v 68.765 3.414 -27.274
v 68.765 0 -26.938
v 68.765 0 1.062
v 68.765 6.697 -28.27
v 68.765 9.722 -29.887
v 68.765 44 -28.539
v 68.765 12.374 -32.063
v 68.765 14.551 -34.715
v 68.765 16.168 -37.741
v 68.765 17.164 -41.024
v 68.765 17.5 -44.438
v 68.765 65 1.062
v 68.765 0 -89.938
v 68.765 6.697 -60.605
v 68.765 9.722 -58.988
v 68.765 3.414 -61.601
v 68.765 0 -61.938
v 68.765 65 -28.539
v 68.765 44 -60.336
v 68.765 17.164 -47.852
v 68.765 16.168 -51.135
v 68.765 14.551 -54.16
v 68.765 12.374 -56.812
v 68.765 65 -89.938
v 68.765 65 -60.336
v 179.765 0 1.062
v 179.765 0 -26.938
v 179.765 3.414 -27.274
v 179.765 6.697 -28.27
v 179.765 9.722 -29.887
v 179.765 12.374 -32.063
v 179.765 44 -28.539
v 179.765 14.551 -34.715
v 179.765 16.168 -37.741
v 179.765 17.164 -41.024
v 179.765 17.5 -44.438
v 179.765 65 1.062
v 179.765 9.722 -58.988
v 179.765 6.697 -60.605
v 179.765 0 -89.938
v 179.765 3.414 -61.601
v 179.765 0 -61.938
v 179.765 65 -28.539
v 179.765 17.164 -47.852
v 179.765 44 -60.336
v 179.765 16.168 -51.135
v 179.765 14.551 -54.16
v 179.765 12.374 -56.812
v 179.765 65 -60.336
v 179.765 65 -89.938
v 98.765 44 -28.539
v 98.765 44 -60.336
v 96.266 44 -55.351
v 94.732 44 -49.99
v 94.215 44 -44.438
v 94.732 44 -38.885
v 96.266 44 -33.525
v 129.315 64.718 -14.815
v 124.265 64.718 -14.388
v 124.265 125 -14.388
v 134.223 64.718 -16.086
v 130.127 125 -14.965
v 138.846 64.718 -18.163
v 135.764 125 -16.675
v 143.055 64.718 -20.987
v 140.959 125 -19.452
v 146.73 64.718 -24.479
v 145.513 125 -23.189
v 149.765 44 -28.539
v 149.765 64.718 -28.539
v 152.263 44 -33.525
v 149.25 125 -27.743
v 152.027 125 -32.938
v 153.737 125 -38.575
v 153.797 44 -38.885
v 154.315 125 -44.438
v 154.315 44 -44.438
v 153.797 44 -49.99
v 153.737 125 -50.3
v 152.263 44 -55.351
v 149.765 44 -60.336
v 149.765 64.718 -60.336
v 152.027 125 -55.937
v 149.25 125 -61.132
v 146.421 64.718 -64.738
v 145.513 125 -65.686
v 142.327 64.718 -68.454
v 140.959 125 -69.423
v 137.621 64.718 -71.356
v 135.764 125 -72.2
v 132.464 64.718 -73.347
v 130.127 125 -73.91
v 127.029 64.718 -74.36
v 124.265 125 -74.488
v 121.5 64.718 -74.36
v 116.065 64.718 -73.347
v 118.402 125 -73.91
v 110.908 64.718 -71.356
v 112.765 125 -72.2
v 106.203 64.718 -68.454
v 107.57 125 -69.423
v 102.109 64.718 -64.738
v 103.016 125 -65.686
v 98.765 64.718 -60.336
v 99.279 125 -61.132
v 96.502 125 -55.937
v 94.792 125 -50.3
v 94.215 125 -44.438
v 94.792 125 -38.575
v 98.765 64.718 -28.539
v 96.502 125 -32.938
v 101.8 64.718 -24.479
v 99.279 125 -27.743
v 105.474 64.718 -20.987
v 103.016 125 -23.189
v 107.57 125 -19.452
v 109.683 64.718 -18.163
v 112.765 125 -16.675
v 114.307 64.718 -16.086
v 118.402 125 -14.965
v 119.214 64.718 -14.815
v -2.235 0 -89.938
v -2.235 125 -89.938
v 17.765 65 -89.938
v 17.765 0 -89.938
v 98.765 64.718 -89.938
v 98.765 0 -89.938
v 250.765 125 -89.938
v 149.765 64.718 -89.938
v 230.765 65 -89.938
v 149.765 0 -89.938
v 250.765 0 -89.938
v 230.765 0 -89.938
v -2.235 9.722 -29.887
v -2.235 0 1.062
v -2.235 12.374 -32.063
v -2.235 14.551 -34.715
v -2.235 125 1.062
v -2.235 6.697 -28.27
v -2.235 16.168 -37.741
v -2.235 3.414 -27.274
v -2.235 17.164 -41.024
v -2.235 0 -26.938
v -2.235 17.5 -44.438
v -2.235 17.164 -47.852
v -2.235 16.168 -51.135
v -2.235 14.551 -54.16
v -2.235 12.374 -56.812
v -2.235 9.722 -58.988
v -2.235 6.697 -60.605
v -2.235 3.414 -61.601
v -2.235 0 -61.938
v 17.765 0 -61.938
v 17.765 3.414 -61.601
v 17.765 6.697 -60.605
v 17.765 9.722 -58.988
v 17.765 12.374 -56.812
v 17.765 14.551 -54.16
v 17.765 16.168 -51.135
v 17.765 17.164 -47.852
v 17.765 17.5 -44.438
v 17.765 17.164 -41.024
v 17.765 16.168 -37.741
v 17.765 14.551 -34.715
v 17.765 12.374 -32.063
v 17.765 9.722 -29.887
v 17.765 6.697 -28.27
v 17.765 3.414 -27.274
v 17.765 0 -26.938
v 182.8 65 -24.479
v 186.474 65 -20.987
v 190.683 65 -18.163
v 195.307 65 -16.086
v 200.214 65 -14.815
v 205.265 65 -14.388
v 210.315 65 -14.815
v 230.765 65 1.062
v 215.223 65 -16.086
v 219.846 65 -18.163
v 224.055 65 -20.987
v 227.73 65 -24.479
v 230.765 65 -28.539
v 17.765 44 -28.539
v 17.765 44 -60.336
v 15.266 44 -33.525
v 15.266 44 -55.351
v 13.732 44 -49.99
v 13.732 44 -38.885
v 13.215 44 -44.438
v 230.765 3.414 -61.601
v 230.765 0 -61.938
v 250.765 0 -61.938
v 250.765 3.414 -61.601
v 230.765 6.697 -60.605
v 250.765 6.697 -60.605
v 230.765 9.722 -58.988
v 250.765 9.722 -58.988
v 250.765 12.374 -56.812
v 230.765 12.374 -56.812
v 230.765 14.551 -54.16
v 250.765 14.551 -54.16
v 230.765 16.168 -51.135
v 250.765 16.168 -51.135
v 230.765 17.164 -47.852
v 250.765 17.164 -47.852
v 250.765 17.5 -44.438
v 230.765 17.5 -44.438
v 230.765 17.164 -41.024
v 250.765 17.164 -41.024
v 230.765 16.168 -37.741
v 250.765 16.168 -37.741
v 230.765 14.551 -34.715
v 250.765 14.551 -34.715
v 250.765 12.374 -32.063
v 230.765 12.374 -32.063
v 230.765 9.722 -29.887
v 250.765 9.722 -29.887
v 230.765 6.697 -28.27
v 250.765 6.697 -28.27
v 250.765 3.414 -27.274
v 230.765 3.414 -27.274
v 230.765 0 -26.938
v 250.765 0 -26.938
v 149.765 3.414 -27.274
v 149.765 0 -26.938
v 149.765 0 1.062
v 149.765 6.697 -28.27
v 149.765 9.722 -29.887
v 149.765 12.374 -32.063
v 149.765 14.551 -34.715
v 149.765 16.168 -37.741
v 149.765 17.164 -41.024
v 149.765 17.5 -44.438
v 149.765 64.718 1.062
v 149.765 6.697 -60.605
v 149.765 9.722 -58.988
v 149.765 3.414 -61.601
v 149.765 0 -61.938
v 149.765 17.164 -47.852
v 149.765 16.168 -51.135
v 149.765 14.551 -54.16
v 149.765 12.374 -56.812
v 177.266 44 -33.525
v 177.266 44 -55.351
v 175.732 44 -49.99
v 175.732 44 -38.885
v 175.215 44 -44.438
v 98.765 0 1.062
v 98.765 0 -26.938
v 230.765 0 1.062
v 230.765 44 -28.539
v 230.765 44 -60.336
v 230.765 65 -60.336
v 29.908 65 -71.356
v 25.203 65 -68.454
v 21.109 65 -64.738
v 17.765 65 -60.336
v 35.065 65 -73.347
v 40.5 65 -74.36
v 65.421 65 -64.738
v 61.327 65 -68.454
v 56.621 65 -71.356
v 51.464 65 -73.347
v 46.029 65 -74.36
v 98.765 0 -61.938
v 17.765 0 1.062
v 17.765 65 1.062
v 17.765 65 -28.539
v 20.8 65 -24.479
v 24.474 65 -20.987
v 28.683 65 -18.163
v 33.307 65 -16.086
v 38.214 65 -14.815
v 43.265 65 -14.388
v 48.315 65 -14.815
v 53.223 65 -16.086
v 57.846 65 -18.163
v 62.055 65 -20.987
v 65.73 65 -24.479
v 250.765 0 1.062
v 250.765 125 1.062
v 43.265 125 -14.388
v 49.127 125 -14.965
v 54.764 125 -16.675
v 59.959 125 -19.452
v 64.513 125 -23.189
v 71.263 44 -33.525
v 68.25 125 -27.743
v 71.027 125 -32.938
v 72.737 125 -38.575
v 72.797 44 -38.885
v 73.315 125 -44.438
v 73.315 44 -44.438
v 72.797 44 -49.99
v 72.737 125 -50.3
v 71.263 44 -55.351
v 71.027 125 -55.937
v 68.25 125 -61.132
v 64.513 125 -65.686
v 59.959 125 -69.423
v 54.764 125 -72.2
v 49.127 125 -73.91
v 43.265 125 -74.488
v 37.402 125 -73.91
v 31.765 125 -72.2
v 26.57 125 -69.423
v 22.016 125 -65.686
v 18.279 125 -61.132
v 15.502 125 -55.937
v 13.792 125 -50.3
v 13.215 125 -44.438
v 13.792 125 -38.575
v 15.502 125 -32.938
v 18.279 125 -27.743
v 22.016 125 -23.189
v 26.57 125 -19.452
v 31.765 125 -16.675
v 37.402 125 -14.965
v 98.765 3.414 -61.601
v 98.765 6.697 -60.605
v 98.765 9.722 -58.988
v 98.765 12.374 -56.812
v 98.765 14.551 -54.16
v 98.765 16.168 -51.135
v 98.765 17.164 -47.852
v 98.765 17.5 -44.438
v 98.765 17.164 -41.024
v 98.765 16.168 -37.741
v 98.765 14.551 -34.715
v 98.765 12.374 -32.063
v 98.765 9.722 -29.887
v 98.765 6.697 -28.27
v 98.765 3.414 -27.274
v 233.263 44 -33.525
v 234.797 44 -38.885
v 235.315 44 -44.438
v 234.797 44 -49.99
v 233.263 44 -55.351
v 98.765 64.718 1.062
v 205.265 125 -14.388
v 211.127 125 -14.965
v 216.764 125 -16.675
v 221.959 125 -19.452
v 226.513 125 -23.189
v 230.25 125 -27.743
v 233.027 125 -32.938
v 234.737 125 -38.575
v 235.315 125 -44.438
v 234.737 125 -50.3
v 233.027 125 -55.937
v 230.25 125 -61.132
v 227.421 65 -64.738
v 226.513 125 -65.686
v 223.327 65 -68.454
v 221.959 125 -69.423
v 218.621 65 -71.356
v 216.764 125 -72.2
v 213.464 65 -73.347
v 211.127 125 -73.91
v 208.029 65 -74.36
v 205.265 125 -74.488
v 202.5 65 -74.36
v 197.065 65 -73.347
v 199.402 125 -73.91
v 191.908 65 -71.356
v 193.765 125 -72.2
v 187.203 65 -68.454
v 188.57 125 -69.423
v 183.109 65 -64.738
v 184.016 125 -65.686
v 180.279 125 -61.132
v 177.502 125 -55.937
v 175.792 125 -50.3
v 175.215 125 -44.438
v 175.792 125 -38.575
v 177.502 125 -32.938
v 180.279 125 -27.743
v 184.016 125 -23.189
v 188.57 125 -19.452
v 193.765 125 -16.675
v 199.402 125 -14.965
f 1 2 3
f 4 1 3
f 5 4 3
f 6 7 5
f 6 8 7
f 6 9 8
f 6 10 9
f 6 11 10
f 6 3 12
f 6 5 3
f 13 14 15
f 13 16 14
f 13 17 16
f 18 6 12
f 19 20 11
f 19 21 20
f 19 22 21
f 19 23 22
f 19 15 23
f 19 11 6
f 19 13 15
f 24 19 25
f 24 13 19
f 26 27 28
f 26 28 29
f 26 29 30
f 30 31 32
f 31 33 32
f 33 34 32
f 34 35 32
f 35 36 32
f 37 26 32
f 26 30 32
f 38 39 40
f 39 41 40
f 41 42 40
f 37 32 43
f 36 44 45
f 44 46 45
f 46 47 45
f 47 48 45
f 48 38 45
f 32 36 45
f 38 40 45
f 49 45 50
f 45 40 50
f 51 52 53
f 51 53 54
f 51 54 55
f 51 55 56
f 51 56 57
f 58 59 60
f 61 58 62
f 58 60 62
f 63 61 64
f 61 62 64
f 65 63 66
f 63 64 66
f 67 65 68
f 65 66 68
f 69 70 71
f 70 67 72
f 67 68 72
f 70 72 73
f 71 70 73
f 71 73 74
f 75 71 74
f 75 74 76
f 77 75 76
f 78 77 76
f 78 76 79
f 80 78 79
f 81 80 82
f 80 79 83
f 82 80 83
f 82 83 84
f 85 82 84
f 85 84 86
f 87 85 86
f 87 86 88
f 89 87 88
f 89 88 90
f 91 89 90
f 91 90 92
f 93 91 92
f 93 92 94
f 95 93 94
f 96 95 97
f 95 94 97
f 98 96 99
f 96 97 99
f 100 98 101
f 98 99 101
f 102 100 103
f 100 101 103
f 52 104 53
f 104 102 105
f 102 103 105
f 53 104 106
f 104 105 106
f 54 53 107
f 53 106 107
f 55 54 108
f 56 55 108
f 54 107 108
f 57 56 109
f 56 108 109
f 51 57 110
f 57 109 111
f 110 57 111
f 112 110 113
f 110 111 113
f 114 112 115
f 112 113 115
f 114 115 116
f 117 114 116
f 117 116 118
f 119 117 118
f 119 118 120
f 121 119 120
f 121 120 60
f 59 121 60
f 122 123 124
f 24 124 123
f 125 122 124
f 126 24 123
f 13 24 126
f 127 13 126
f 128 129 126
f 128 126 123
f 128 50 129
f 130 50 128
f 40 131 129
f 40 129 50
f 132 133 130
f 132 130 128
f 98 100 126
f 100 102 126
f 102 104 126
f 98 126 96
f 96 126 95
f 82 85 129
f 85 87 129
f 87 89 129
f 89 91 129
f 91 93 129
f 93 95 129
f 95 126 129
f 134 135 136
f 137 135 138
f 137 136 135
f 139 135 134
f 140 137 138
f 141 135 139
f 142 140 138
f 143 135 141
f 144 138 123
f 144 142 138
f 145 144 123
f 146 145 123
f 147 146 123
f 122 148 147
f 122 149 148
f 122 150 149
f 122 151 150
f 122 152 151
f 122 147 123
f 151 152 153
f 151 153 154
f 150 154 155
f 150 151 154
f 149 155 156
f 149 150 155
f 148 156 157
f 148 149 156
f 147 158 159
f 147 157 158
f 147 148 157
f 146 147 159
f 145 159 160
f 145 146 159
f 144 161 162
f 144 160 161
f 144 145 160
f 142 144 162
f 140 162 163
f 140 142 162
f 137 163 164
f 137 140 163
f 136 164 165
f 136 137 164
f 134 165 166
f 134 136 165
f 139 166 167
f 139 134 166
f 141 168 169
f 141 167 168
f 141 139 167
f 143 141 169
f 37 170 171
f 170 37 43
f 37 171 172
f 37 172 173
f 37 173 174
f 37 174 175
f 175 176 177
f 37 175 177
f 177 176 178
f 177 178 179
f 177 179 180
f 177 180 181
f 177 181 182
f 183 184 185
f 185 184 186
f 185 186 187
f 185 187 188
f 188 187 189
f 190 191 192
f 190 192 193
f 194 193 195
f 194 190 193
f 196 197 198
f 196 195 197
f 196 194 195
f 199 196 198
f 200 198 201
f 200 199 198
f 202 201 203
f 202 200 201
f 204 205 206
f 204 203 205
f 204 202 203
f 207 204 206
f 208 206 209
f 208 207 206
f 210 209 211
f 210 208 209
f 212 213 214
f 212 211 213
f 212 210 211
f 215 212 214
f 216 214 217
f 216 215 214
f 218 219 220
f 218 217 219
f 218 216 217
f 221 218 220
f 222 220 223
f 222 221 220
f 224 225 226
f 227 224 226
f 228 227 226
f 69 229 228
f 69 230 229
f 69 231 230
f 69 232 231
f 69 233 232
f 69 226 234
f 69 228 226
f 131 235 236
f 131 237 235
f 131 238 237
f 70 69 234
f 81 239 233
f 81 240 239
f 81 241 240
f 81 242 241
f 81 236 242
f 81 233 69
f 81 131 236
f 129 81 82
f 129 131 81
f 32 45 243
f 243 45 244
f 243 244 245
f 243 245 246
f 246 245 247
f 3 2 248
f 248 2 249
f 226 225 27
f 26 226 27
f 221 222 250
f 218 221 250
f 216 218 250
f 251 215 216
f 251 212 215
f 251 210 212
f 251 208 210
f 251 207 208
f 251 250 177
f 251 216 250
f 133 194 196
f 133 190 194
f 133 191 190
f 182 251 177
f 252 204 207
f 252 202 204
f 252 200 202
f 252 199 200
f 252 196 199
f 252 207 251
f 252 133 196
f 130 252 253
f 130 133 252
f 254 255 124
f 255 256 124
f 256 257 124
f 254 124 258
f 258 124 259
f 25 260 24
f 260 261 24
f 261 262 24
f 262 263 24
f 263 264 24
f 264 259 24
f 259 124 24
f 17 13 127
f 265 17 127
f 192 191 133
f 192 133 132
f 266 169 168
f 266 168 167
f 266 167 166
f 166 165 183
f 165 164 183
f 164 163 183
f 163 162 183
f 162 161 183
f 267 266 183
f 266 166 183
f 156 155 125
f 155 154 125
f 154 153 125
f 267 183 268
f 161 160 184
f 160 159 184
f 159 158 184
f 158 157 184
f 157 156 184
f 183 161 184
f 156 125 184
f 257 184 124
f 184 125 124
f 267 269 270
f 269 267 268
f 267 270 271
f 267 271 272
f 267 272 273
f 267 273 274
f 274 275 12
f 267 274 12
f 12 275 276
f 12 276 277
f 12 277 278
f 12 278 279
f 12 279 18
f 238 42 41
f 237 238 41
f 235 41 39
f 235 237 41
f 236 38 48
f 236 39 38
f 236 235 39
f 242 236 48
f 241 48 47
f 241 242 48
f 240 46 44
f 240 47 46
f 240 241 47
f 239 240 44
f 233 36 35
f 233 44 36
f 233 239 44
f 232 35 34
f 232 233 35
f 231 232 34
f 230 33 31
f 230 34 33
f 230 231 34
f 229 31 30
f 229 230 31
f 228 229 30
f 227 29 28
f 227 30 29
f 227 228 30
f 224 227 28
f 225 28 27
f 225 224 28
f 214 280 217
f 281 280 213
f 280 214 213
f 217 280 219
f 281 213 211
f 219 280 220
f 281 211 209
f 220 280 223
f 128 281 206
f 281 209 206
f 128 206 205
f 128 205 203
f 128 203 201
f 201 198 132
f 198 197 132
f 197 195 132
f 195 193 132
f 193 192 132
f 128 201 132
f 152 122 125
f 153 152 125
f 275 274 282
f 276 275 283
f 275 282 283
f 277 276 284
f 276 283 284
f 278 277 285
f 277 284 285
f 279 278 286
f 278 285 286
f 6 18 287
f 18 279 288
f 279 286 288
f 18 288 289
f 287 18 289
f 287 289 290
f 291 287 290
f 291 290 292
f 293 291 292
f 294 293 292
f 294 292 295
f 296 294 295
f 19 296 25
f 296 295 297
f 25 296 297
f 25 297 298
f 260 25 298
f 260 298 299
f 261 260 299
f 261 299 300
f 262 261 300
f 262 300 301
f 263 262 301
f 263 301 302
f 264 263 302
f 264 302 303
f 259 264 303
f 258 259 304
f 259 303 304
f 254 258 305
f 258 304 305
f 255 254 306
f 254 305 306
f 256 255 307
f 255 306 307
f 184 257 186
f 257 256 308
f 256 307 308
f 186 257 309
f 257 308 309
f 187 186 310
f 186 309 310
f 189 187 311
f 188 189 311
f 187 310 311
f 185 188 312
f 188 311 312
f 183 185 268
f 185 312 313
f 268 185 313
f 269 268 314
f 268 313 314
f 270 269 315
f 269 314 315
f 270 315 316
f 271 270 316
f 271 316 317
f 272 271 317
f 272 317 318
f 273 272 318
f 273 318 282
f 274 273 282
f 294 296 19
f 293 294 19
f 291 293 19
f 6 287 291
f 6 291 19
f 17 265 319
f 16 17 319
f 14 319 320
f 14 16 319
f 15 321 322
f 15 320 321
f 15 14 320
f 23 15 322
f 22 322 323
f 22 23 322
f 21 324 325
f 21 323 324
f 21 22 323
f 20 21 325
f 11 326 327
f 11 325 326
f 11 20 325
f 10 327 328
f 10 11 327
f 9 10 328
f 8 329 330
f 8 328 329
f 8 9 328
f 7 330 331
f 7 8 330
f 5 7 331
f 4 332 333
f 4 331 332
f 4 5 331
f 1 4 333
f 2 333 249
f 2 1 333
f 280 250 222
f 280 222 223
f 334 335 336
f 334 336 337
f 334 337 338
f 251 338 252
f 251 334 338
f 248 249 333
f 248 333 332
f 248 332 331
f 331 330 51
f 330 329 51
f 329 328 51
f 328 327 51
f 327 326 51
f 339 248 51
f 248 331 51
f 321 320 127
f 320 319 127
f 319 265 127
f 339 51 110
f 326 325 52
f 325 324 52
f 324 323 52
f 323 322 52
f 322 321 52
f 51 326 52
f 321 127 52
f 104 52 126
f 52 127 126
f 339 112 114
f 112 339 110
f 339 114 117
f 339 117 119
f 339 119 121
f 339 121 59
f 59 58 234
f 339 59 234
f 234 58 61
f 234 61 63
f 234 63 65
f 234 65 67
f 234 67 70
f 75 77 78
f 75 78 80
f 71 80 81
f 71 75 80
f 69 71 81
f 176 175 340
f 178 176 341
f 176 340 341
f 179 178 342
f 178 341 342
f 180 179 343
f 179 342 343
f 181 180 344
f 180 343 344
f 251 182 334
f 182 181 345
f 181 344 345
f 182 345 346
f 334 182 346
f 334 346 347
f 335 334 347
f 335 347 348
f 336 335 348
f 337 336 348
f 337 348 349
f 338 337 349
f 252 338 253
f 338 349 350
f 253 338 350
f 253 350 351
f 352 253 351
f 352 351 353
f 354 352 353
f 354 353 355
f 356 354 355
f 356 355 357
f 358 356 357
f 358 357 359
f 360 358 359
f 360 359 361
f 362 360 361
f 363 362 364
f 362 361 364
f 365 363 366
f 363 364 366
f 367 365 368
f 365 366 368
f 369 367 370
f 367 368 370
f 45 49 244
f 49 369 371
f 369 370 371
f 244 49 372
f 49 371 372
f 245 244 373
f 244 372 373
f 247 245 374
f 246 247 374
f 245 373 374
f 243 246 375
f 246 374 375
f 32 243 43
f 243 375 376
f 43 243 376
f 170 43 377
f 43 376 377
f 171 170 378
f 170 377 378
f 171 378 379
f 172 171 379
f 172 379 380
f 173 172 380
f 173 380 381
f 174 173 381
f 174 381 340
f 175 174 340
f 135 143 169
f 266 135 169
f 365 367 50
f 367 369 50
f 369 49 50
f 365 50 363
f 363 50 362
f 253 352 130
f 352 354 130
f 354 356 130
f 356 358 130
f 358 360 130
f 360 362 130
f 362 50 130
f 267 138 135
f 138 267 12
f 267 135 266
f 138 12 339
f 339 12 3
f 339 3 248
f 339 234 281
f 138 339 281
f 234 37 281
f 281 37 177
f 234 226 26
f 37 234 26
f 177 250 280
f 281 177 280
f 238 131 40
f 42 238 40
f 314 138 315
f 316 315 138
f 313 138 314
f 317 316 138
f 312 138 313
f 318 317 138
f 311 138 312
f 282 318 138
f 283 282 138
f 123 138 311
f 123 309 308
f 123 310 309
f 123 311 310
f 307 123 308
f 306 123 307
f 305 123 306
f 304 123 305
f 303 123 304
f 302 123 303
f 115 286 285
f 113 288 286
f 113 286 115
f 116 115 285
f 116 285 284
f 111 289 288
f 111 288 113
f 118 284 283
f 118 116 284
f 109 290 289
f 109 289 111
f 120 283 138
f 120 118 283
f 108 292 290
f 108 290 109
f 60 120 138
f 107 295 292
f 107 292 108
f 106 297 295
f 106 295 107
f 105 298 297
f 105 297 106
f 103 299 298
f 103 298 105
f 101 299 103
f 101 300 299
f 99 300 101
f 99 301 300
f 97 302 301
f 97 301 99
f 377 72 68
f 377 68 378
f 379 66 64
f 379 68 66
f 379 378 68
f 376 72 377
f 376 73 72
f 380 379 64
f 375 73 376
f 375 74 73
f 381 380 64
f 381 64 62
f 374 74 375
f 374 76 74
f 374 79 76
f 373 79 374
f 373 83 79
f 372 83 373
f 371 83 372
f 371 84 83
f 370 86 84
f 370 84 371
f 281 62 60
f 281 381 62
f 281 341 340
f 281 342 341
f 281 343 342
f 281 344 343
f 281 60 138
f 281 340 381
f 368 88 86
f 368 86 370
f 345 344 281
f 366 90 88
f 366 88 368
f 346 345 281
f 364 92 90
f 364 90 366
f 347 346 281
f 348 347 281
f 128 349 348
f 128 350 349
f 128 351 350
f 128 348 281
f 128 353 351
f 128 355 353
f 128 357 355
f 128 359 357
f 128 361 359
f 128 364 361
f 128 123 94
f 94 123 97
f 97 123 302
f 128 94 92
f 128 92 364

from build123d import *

# Parameters (mm, degrees)
SKETCH1_W               = 6426.2
SKETCH1_H               = 2311.4
BOSS_EXTRUDE1_DEPTH     = 3175
SKETCH2_R               = 763.27
CUT_EXTRUDE1_DEPTH      = 2057.4
CUT_EXTRUDE3_DEPTH      = 7475.536972742
CUT_EXTRUDE3_DEPTH_BACK = 7475.536972742
SKETCH6_W               = 1295.4
SKETCH6_H               = 1651
CUT_EXTRUDE4_DEPTH      = 7523.97968682
CUT_EXTRUDE4_DEPTH_BACK = 7523.97968682
SKETCH7_R               = 444.5
SCALE1_SCALE            = 0.039370079


with BuildPart() as part:
    # Sketch1 → Boss-Extrude1 (new body)
    with BuildSketch(Plane(origin=(0, 0, 0), x_dir=(1, 0, 0), z_dir=(0, 1, 0))):
        with Locations((3156.321169036, 1128.715007899)):
            Rectangle(SKETCH1_W, SKETCH1_H)
    extrude(amount=BOSS_EXTRUDE1_DEPTH)

    # Sketch2 → Cut-Extrude1 (cut)
    with BuildSketch(Plane(origin=(0, 3175, 0), x_dir=(1, 0, 0), z_dir=(0, 1, 0))):
        with Locations(Location((1098.921169036, 1128.715007899, 0), (0, 0, 270))):
            Circle(SKETCH2_R)
        with Locations(Location((3156.321169036, 1128.715007899, 0), (0, 0, 270))):
            Circle(SKETCH2_R)
        with Locations(Location((5213.721169036, 1128.715007899, 0), (0, 0, 270))):
            Circle(SKETCH2_R)
    extrude(amount=-CUT_EXTRUDE1_DEPTH, mode=Mode.SUBTRACT)

    # Sketch6 → Cut-Extrude3 (cut, two sides: drawn at the far end of the back side and taken through both)
    with BuildSketch(Plane.XY.offset(-CUT_EXTRUDE3_DEPTH_BACK)):
        with Locations((3156.321169036, 818.341718397)):
            Rectangle(SKETCH6_W, SKETCH6_H)
        with Locations((5213.721169036, 825.5)):
            Rectangle(SKETCH6_W, SKETCH6_H)
        with Locations((1098.921169036, 825.5)):
            Rectangle(SKETCH6_W, SKETCH6_H)
    extrude(amount=CUT_EXTRUDE3_DEPTH + CUT_EXTRUDE3_DEPTH_BACK, mode=Mode.SUBTRACT)

    # Sketch7 → Cut-Extrude4 (cut, two sides: drawn at the far end of the back side and taken through both)
    with BuildSketch(Plane(origin=(6369.421169036, 0, 0), x_dir=(0, 0, -1), z_dir=(1, 0, 0)).offset(-CUT_EXTRUDE4_DEPTH_BACK)):
        with Locations((1128.715007899, 0)):
            Circle(SKETCH7_R)
    extrude(amount=CUT_EXTRUDE4_DEPTH + CUT_EXTRUDE4_DEPTH_BACK, mode=Mode.SUBTRACT)


with BuildPart() as part_1:
    # Scale1: scaled about (0, 0, 0)
    add(part.part.scale(SCALE1_SCALE))


solid = part_1.part
